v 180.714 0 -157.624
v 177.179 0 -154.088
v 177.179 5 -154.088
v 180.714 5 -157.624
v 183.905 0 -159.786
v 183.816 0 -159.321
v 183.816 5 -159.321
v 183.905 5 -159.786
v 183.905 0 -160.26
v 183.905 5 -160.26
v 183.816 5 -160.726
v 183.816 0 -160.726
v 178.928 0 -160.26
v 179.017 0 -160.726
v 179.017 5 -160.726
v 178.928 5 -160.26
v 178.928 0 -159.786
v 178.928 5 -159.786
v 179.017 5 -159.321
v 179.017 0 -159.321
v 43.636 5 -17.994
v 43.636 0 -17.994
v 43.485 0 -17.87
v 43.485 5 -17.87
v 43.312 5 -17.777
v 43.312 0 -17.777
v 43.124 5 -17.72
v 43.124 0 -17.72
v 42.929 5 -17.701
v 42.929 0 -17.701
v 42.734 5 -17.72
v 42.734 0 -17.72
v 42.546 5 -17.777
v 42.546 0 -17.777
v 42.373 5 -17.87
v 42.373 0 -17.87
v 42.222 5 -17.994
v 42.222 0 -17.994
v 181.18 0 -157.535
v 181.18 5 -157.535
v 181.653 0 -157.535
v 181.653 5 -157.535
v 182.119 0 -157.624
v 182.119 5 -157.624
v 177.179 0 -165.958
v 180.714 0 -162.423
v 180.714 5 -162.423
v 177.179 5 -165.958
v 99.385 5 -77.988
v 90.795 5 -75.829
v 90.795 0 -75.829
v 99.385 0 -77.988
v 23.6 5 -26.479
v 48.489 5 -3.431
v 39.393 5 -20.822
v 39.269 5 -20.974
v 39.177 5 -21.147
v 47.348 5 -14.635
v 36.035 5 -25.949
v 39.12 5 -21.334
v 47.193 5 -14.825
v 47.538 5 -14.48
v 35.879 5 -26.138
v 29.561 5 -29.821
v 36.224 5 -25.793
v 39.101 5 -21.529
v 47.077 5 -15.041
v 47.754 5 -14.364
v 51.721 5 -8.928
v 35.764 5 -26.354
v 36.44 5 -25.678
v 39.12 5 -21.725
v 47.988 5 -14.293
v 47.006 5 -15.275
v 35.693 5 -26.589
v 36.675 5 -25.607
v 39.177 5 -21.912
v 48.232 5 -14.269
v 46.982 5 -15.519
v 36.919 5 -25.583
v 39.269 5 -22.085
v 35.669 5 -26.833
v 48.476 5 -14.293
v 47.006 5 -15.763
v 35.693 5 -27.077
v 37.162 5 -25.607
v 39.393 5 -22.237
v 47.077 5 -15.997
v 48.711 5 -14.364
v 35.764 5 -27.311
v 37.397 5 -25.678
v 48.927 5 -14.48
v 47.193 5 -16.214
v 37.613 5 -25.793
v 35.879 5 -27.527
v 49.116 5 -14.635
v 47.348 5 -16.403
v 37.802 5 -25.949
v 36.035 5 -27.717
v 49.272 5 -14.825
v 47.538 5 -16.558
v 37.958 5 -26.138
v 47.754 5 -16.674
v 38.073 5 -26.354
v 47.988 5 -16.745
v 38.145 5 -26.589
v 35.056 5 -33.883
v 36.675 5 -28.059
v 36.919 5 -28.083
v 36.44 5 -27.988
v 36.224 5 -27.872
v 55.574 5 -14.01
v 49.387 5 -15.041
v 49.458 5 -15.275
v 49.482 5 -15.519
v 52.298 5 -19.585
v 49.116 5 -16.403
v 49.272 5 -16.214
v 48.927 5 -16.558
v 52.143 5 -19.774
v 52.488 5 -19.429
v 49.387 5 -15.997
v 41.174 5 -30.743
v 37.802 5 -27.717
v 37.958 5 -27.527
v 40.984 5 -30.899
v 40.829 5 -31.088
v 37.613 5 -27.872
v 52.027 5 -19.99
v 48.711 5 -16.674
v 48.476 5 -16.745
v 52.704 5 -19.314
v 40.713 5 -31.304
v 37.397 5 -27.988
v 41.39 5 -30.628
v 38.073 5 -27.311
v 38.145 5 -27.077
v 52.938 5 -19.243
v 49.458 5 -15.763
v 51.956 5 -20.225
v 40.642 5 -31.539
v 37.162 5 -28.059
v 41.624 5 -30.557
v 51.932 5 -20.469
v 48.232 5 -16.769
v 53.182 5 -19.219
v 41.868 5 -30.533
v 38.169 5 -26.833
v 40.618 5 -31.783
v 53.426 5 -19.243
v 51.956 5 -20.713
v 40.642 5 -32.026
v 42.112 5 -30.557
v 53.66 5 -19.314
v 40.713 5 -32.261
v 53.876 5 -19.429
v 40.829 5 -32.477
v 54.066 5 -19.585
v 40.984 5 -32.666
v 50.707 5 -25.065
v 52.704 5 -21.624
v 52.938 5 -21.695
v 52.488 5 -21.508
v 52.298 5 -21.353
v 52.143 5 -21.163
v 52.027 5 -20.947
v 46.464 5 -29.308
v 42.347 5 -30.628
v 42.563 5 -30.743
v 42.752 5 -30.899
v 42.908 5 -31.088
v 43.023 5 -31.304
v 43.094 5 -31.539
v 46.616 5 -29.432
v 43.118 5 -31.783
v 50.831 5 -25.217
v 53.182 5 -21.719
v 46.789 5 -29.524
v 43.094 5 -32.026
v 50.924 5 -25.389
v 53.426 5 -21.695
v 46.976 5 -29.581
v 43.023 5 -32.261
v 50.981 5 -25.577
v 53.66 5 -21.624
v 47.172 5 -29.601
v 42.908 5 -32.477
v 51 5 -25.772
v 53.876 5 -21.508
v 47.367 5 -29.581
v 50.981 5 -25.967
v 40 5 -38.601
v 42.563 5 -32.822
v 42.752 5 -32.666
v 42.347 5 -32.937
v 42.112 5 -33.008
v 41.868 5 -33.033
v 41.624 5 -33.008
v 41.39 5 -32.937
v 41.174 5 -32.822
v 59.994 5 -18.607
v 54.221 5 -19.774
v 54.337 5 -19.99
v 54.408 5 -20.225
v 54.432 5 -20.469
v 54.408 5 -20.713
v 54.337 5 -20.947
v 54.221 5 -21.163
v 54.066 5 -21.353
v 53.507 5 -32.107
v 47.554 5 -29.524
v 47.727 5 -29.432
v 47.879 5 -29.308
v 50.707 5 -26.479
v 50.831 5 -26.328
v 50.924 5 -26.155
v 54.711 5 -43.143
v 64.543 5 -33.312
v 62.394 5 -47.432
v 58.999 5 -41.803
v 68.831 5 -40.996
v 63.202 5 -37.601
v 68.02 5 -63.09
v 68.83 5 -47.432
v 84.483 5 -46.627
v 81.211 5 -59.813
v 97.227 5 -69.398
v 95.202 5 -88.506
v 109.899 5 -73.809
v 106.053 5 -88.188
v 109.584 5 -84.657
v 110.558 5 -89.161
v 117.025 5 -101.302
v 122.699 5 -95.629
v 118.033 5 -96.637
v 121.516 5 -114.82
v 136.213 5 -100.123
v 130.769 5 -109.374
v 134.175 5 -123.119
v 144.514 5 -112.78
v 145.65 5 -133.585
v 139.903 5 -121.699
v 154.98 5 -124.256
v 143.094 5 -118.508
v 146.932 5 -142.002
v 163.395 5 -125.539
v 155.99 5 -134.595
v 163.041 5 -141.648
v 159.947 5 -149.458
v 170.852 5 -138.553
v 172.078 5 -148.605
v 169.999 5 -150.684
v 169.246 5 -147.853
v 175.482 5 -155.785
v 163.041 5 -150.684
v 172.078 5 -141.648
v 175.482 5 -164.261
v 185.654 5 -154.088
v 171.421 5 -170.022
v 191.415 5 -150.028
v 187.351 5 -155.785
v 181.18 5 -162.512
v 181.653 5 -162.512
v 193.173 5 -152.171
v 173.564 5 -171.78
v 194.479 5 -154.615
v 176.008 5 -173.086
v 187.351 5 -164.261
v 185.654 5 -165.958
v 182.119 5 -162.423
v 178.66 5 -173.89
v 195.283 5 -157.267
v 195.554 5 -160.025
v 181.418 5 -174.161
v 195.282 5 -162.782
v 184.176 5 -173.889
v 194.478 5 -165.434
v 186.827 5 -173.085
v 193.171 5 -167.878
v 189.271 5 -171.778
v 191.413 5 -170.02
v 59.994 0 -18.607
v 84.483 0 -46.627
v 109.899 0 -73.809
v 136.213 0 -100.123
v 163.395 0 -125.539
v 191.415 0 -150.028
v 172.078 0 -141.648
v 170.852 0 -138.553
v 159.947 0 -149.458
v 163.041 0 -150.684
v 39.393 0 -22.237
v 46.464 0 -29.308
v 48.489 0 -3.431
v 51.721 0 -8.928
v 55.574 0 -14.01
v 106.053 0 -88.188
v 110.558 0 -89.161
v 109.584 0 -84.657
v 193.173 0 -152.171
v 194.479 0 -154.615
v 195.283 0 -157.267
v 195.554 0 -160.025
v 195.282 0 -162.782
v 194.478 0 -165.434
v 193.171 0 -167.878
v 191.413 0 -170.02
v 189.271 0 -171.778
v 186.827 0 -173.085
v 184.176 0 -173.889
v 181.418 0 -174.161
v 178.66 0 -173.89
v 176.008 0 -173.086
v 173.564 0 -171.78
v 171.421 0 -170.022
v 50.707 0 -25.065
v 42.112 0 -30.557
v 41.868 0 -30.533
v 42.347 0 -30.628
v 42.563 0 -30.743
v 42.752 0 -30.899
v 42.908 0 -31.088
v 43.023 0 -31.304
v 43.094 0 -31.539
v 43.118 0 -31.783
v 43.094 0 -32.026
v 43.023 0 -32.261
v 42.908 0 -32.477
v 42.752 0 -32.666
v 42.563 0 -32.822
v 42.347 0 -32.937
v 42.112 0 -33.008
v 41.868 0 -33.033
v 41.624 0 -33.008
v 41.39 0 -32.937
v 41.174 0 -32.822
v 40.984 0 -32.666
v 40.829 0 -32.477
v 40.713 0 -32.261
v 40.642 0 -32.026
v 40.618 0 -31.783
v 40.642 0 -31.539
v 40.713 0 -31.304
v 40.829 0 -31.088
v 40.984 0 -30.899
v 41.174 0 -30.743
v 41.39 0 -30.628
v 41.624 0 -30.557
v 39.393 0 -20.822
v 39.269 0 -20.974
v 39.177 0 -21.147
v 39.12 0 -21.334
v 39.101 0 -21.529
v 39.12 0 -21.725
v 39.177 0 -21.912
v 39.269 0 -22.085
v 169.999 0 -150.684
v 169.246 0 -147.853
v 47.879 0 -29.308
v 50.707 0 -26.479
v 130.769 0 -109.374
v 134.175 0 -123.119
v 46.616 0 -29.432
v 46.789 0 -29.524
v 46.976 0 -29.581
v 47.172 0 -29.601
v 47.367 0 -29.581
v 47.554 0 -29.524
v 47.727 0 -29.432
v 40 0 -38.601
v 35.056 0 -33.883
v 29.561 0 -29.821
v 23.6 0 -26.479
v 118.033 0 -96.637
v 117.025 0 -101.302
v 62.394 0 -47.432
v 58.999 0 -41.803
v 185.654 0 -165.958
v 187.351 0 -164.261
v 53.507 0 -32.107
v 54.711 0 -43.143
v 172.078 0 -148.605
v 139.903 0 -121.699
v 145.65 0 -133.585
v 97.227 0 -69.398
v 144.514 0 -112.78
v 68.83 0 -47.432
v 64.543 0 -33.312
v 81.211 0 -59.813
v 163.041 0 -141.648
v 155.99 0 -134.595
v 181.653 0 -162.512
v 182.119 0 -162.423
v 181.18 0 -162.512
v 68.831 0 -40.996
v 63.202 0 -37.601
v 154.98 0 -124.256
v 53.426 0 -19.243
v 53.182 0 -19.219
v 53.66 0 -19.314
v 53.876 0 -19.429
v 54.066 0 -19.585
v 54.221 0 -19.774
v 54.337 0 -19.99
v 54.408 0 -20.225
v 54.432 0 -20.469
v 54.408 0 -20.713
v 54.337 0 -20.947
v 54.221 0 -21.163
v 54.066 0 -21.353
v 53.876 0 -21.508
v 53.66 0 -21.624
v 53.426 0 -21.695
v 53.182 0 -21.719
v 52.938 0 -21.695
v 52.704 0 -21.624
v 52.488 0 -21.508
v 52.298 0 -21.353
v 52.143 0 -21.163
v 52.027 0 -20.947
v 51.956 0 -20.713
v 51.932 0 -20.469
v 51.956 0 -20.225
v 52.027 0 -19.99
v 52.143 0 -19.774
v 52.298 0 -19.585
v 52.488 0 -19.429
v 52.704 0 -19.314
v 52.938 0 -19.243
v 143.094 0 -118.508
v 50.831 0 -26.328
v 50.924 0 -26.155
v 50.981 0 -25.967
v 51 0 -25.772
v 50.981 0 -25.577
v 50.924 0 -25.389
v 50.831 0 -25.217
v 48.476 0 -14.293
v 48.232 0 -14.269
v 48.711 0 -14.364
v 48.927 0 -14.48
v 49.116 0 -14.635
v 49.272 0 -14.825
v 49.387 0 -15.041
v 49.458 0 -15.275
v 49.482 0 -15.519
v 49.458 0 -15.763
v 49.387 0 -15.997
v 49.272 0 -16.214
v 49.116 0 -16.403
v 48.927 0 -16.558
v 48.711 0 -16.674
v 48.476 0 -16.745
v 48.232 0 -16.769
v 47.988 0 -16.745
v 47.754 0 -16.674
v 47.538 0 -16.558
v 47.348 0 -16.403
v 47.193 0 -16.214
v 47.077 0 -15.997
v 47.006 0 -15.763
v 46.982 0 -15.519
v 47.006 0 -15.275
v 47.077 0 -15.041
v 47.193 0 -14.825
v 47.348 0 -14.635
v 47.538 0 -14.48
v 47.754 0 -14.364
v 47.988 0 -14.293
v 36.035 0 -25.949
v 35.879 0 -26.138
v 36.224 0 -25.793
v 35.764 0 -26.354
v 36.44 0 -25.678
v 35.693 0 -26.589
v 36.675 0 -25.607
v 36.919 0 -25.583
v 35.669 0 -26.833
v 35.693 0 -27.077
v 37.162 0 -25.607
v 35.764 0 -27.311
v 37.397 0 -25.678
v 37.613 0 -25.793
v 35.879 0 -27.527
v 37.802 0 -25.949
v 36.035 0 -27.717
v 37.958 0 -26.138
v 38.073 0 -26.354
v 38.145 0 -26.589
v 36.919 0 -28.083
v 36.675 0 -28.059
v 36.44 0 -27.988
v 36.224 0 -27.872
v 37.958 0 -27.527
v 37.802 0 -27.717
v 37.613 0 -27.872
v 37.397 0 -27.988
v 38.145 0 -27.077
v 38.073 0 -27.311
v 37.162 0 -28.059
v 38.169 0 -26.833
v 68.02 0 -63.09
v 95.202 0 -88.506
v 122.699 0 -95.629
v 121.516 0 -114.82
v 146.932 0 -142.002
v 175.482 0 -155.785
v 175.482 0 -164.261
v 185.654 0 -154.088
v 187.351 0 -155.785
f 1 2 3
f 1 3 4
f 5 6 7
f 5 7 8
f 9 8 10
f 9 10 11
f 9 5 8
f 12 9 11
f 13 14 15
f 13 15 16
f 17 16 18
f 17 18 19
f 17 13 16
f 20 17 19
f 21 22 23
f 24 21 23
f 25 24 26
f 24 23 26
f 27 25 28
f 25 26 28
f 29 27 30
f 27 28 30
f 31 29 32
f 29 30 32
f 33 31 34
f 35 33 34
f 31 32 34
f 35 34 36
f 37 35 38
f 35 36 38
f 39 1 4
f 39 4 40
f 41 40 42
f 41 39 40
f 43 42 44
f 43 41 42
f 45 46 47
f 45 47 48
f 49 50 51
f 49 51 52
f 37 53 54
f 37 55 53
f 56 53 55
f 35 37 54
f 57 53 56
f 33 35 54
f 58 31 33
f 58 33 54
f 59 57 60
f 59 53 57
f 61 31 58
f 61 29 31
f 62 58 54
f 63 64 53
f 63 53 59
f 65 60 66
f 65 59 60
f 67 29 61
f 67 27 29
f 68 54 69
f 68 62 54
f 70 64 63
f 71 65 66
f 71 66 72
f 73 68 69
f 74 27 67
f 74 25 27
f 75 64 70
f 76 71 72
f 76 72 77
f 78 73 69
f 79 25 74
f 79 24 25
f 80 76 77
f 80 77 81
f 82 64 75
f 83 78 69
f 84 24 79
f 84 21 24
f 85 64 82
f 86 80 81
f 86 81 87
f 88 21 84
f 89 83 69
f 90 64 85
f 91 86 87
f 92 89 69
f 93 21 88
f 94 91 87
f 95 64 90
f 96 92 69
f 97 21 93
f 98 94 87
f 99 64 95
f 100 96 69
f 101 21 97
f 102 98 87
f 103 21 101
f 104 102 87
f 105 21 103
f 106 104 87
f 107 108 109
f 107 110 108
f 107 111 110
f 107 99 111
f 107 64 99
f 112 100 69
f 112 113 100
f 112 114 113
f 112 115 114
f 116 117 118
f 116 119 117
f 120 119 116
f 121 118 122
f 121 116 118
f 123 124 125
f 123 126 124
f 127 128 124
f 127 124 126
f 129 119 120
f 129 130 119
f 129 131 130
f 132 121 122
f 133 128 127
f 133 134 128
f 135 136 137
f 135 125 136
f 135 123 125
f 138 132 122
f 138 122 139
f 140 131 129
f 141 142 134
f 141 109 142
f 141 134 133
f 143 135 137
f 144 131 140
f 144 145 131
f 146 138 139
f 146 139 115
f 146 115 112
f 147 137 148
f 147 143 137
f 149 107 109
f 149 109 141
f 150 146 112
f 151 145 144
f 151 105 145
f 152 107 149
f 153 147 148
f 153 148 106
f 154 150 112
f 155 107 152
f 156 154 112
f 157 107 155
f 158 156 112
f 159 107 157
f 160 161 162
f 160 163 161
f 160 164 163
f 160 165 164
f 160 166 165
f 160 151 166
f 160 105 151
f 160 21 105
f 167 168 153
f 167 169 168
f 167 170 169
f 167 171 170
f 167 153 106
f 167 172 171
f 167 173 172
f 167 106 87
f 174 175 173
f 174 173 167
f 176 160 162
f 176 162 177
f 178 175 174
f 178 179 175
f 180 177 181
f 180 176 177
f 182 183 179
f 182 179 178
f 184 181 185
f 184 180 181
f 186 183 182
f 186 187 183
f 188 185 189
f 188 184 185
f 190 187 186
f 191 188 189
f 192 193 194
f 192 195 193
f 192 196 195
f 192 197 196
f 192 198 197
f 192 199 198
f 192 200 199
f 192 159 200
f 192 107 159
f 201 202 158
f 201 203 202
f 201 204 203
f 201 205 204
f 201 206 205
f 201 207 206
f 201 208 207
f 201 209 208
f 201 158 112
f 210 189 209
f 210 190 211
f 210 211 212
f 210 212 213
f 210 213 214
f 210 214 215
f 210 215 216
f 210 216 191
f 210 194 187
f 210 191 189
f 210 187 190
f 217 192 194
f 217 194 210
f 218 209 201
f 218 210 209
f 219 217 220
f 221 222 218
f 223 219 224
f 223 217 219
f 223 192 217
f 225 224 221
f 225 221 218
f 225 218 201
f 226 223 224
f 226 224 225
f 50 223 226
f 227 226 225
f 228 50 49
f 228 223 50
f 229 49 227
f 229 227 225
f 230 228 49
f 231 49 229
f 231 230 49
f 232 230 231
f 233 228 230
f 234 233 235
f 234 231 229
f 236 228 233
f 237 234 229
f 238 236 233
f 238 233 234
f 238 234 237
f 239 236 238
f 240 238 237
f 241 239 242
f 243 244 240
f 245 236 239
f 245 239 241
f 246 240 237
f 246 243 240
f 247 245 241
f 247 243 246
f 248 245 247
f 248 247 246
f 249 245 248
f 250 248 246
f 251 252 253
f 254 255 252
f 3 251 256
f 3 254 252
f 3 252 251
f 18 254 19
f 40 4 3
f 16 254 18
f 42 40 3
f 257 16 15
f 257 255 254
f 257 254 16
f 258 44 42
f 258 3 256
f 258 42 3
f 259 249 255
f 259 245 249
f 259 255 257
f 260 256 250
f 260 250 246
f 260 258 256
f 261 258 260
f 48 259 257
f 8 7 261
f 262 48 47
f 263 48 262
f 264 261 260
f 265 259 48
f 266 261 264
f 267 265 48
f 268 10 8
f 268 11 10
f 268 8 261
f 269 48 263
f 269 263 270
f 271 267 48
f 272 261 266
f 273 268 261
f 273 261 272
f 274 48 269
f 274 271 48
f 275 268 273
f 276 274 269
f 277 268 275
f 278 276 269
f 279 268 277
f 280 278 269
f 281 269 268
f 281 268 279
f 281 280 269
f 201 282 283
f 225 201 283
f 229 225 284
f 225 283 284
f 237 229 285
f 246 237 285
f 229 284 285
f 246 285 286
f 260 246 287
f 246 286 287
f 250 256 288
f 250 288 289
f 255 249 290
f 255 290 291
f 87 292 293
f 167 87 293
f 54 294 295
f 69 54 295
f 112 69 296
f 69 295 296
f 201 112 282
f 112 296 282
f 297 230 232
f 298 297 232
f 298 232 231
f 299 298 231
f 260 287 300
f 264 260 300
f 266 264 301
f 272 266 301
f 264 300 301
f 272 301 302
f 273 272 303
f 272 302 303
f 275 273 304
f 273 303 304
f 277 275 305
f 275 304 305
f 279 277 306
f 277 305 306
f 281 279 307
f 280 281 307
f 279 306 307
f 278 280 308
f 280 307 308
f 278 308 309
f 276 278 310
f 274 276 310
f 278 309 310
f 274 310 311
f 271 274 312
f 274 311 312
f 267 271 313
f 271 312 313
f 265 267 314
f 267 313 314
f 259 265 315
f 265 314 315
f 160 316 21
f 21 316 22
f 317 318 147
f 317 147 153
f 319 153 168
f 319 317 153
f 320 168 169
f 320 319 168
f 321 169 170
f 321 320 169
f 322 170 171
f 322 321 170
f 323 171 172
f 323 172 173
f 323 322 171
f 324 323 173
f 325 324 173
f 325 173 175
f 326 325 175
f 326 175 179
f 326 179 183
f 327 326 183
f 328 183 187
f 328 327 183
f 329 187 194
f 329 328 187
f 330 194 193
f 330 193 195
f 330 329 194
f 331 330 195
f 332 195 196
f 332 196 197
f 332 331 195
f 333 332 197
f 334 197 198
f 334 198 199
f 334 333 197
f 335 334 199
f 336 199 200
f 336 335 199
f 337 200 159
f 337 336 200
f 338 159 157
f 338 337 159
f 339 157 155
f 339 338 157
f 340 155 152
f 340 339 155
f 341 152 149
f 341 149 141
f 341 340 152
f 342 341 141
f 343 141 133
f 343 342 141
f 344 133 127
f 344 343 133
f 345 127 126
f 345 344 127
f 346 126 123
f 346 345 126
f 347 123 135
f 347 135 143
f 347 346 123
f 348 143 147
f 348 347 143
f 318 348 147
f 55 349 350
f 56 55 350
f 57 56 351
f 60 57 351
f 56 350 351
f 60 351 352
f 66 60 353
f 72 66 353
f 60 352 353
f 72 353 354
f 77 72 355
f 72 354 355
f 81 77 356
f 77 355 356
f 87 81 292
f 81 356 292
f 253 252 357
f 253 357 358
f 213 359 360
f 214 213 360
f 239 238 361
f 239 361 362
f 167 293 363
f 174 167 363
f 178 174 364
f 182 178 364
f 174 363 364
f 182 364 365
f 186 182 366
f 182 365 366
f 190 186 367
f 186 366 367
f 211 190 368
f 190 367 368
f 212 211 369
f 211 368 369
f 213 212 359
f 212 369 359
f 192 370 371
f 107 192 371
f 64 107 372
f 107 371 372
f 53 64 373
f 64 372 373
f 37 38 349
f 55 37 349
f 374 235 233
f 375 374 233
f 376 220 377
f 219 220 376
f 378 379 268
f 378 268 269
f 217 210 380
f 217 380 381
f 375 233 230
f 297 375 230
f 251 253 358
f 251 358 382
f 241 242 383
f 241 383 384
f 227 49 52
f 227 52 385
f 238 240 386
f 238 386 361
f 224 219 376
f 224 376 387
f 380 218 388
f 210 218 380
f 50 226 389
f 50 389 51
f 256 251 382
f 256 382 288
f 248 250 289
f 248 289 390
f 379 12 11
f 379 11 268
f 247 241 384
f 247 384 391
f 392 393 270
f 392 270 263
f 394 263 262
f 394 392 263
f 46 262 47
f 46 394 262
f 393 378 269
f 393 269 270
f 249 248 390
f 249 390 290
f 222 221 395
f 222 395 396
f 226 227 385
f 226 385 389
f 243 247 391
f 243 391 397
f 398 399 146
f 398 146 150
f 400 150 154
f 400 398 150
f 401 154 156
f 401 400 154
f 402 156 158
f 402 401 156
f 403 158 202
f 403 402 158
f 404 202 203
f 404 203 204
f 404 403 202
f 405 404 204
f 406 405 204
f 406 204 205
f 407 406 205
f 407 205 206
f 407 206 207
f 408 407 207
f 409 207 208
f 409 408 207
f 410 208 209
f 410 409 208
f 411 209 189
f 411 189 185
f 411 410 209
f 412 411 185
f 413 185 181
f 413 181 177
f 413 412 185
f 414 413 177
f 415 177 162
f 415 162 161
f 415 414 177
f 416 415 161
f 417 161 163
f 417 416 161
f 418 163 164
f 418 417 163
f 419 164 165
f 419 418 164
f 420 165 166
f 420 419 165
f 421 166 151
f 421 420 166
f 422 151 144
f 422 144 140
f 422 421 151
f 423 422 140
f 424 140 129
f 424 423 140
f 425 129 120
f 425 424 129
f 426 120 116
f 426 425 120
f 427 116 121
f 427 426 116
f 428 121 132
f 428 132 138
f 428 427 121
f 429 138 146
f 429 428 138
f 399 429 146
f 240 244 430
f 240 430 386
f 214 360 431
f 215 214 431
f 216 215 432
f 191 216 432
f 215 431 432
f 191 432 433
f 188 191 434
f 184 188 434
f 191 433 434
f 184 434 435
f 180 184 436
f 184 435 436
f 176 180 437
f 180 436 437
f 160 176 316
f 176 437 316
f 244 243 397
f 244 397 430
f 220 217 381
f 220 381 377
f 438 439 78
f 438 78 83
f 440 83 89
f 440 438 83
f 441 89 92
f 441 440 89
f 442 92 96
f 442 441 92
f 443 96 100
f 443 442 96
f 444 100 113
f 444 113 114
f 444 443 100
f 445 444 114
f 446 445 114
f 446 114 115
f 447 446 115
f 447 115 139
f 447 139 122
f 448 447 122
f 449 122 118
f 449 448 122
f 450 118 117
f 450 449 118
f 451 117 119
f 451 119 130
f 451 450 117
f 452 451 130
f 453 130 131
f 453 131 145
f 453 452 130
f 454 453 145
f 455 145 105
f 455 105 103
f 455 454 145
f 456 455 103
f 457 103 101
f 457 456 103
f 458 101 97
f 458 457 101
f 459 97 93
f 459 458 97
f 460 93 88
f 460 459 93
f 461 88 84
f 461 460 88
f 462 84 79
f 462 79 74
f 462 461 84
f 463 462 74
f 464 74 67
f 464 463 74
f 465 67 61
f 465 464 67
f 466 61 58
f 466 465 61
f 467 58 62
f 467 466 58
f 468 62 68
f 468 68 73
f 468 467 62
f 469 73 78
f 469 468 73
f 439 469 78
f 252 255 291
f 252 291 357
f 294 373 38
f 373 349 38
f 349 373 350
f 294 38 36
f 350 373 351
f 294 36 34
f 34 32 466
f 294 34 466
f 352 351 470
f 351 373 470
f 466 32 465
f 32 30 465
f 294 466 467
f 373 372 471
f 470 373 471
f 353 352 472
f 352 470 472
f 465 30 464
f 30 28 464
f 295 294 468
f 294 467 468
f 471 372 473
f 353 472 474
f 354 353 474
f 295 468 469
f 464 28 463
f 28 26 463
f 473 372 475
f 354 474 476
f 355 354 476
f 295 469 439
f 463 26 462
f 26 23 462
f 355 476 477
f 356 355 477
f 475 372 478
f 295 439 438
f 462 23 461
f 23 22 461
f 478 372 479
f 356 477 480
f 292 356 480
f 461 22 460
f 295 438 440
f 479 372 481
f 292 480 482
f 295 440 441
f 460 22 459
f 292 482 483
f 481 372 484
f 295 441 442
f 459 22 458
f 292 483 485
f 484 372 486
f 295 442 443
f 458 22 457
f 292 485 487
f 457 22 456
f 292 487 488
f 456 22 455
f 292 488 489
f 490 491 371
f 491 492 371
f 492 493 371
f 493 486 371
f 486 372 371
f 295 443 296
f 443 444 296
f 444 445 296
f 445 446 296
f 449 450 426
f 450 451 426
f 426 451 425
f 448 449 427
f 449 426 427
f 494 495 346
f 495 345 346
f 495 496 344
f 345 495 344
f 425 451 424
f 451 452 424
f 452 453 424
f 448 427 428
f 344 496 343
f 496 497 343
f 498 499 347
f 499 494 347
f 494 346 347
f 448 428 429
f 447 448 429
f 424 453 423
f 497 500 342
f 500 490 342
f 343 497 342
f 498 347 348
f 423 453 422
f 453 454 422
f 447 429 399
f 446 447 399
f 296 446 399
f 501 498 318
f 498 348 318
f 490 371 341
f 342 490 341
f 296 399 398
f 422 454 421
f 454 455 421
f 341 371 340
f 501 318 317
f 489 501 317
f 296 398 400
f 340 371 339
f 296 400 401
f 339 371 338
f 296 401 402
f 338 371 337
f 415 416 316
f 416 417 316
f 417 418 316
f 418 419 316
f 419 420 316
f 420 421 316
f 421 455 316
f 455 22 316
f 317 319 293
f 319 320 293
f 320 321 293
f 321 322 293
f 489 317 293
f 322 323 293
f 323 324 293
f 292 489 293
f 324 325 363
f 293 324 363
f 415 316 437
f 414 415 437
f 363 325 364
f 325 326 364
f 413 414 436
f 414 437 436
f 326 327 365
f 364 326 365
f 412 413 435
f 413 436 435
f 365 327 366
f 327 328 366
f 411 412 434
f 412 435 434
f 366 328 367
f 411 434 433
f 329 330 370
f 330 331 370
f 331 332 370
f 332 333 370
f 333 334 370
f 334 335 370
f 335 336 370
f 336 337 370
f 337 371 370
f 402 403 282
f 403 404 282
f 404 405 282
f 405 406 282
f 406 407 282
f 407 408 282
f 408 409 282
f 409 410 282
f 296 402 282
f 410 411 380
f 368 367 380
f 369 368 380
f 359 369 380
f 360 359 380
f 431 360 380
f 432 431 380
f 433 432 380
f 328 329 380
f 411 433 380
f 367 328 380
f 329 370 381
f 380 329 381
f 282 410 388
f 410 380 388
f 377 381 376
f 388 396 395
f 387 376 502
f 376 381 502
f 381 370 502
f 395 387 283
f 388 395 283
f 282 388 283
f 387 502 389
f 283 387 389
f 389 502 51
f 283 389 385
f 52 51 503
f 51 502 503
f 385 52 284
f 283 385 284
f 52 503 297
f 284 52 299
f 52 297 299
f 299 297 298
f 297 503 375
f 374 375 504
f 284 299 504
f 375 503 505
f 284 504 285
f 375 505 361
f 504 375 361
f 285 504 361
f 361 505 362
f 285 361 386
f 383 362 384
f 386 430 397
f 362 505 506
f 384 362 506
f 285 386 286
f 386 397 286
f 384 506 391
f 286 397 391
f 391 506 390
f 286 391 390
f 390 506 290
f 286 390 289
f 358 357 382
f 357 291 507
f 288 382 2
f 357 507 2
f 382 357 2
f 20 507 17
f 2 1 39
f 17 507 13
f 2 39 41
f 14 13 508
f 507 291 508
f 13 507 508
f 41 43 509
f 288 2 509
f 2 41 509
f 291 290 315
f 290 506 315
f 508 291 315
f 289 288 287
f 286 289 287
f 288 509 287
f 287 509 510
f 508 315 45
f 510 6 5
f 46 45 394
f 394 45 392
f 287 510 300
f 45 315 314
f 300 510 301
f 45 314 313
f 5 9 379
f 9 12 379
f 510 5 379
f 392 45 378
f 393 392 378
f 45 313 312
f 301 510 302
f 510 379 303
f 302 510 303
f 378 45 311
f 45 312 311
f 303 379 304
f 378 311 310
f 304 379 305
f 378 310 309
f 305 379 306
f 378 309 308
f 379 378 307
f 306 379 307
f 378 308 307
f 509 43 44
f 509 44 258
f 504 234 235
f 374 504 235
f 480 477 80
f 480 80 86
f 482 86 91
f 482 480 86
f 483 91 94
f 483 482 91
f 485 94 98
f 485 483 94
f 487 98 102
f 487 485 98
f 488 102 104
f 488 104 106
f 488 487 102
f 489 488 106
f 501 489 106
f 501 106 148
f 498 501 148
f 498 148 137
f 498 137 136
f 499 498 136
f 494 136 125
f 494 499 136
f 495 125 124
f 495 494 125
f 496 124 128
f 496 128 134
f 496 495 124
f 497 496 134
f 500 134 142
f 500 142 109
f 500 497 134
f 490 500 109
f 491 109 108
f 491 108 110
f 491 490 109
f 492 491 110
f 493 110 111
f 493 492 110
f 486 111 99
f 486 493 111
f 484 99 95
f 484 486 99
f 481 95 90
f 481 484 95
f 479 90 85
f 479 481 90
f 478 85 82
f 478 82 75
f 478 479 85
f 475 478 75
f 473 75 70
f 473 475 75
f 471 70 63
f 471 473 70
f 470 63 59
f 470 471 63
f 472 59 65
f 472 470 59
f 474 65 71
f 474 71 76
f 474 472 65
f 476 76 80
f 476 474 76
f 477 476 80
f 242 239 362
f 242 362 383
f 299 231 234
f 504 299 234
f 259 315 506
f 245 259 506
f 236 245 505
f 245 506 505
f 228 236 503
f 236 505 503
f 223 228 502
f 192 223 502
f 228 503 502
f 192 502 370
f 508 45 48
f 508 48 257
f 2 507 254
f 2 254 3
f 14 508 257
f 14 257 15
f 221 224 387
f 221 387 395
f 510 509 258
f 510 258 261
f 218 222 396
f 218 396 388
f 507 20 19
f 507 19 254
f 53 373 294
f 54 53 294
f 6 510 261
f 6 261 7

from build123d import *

# Parameters (mm, degrees)
SKETCH1_R           = 1.25
BOSS_EXTRUDE9_DEPTH = 5
CUT_EXTRUDE1_DEPTH  = 10


with BuildPart() as part:
    # Sketch1 → Boss-Extrude9 (new body)
    with BuildSketch(Plane(origin=(0, 0, 0), x_dir=(1, 0, 0), z_dir=(0, 1, 0))):
        with BuildLine():
            Line((23.600035939, 26.479209334), (48.489298853, 3.430633728))
            ThreePointArc((48.489298853, 3.430633728), (53.57304499, 11.525457211), (59.99370362, 18.606826058))
            ThreePointArc((59.99370362, 18.606826058), (122.945468319, 87.076417595), (191.415059857, 150.028182295))
            ThreePointArc((191.415059857, 150.028182295), (191.413333308, 170.020159366), (171.421356237, 170.021885915))
            ThreePointArc((171.421356237, 170.021885915), (108.469591538, 101.552294377), (40, 38.600529677))
            ThreePointArc((40, 38.600529677), (32.372407148, 31.765435558), (23.600035939, 26.479209334))
        make_face()
        with Locations(Location((41.868272016, 31.782510193, 0), (0, 0, 270))):
            Circle(SKETCH1_R, mode=Mode.SUBTRACT)
        with Locations(Location((36.918524548, 26.832762725, 0), (0, 0, 270))):
            Circle(SKETCH1_R, mode=Mode.SUBTRACT)
        with Locations(Location((48.232233047, 15.519054226, 0), (0, 0, 270))):
            Circle(SKETCH1_R, mode=Mode.SUBTRACT)
        with Locations(Location((53.181980515, 20.468801694, 0), (0, 0, 270))):
            Circle(SKETCH1_R, mode=Mode.SUBTRACT)
        with BuildLine():
            Line((187.351349634, 164.261119417), (185.65429336, 165.958175692))
            Line((185.65429336, 165.958175692), (182.118759454, 162.422641786))
            ThreePointArc((182.118759454, 162.422641786), (181.416481349, 162.523307407), (180.714203245, 162.422641786))
            Line((180.714203245, 162.422641786), (177.178669339, 165.958175692))
            Line((177.178669339, 165.958175692), (175.481613064, 164.261119417))
            Line((175.481613064, 164.261119417), (179.01714697, 160.725585511))
            ThreePointArc((179.01714697, 160.725585511), (178.916481349, 160.023307407), (179.01714697, 159.321029302))
            Line((179.01714697, 159.321029302), (175.481613064, 155.785495396))
            Line((175.481613064, 155.785495396), (177.178669339, 154.088439122))
            Line((177.178669339, 154.088439122), (180.714203245, 157.623973027))
            ThreePointArc((180.714203245, 157.623973027), (181.416481349, 157.523307407), (182.118759454, 157.623973027))
            Line((182.118759454, 157.623973027), (185.65429336, 154.088439122))
            Line((185.65429336, 154.088439122), (187.351349634, 155.785495396))
            Line((187.351349634, 155.785495396), (183.815815728, 159.321029302))
            ThreePointArc((183.815815728, 159.321029302), (183.916481349, 160.023307407), (183.815815728, 160.725585511))
            Line((183.815815728, 160.725585511), (187.351349634, 164.261119417))
        make_face(mode=Mode.SUBTRACT)
        with BuildLine():
            Line((47.878679656, 29.307636459), (50.707106781, 26.479209334))
            ThreePointArc((50.707106781, 26.479209334), (51, 25.772102553), (50.707106781, 25.064995772))
            Line((50.707106781, 25.064995772), (43.636038969, 17.99392796))
            ThreePointArc((43.636038969, 17.99392796), (42.928932188, 17.701034741), (42.221825407, 17.99392796))
            Line((42.221825407, 17.99392796), (39.393398282, 20.822355084))
            ThreePointArc((39.393398282, 20.822355084), (39.100505063, 21.529461866), (39.393398282, 22.236568647))
            Line((39.393398282, 22.236568647), (46.464466094, 29.307636459))
            ThreePointArc((46.464466094, 29.307636459), (47.171572875, 29.600529677), (47.878679656, 29.307636459))
        make_face(mode=Mode.SUBTRACT)
    extrude(amount=BOSS_EXTRUDE9_DEPTH)

    # Sketch3 → Cut-Extrude1 (cut)
    with BuildSketch(Plane(origin=(0, 5, 0), x_dir=(1, 0, 0), z_dir=(0, 1, 0))):
        Polygon((53.506506714, 32.107245232), (54.710738681, 43.14334784), (58.999320763, 41.803165939), (62.394448245, 47.431929922), (68.830431901, 47.431929922), (68.830750881, 40.995946275), (63.202155174, 37.600539824), (64.542549624, 33.312024169), align=None)
        Polygon((81.21135591, 59.813467571), (90.79476364, 75.829325012), (99.384762751, 77.987775145), (97.226738359, 69.397669067), align=None)
        Polygon((118.033043481, 96.636980145), (117.02456542, 101.302497895), (106.053446407, 88.187597005), (110.557637166, 89.161203324), (109.584254085, 84.656964316), (122.698611208, 95.628733318), align=None)
        Polygon((130.769320539, 109.373888454), (134.174820431, 123.118631106), (139.902949275, 121.699387207), (145.650358709, 133.585330855), (155.989652523, 134.59547044), (154.980025376, 124.256126574), (143.094366596, 118.508128056), (144.513894391, 112.780069559), align=None)
        Polygon((163.041484482, 141.647651911), (159.946738621, 149.458162099), (163.041484482, 150.684388263), (169.998774874, 150.684388263), (169.246288288, 147.852763247), (172.077876006, 148.605390173), (172.078220823, 141.64809979), (170.852148043, 138.553293158), align=None)
    extrude(amount=-CUT_EXTRUDE1_DEPTH, mode=Mode.SUBTRACT)


solid = part.part
